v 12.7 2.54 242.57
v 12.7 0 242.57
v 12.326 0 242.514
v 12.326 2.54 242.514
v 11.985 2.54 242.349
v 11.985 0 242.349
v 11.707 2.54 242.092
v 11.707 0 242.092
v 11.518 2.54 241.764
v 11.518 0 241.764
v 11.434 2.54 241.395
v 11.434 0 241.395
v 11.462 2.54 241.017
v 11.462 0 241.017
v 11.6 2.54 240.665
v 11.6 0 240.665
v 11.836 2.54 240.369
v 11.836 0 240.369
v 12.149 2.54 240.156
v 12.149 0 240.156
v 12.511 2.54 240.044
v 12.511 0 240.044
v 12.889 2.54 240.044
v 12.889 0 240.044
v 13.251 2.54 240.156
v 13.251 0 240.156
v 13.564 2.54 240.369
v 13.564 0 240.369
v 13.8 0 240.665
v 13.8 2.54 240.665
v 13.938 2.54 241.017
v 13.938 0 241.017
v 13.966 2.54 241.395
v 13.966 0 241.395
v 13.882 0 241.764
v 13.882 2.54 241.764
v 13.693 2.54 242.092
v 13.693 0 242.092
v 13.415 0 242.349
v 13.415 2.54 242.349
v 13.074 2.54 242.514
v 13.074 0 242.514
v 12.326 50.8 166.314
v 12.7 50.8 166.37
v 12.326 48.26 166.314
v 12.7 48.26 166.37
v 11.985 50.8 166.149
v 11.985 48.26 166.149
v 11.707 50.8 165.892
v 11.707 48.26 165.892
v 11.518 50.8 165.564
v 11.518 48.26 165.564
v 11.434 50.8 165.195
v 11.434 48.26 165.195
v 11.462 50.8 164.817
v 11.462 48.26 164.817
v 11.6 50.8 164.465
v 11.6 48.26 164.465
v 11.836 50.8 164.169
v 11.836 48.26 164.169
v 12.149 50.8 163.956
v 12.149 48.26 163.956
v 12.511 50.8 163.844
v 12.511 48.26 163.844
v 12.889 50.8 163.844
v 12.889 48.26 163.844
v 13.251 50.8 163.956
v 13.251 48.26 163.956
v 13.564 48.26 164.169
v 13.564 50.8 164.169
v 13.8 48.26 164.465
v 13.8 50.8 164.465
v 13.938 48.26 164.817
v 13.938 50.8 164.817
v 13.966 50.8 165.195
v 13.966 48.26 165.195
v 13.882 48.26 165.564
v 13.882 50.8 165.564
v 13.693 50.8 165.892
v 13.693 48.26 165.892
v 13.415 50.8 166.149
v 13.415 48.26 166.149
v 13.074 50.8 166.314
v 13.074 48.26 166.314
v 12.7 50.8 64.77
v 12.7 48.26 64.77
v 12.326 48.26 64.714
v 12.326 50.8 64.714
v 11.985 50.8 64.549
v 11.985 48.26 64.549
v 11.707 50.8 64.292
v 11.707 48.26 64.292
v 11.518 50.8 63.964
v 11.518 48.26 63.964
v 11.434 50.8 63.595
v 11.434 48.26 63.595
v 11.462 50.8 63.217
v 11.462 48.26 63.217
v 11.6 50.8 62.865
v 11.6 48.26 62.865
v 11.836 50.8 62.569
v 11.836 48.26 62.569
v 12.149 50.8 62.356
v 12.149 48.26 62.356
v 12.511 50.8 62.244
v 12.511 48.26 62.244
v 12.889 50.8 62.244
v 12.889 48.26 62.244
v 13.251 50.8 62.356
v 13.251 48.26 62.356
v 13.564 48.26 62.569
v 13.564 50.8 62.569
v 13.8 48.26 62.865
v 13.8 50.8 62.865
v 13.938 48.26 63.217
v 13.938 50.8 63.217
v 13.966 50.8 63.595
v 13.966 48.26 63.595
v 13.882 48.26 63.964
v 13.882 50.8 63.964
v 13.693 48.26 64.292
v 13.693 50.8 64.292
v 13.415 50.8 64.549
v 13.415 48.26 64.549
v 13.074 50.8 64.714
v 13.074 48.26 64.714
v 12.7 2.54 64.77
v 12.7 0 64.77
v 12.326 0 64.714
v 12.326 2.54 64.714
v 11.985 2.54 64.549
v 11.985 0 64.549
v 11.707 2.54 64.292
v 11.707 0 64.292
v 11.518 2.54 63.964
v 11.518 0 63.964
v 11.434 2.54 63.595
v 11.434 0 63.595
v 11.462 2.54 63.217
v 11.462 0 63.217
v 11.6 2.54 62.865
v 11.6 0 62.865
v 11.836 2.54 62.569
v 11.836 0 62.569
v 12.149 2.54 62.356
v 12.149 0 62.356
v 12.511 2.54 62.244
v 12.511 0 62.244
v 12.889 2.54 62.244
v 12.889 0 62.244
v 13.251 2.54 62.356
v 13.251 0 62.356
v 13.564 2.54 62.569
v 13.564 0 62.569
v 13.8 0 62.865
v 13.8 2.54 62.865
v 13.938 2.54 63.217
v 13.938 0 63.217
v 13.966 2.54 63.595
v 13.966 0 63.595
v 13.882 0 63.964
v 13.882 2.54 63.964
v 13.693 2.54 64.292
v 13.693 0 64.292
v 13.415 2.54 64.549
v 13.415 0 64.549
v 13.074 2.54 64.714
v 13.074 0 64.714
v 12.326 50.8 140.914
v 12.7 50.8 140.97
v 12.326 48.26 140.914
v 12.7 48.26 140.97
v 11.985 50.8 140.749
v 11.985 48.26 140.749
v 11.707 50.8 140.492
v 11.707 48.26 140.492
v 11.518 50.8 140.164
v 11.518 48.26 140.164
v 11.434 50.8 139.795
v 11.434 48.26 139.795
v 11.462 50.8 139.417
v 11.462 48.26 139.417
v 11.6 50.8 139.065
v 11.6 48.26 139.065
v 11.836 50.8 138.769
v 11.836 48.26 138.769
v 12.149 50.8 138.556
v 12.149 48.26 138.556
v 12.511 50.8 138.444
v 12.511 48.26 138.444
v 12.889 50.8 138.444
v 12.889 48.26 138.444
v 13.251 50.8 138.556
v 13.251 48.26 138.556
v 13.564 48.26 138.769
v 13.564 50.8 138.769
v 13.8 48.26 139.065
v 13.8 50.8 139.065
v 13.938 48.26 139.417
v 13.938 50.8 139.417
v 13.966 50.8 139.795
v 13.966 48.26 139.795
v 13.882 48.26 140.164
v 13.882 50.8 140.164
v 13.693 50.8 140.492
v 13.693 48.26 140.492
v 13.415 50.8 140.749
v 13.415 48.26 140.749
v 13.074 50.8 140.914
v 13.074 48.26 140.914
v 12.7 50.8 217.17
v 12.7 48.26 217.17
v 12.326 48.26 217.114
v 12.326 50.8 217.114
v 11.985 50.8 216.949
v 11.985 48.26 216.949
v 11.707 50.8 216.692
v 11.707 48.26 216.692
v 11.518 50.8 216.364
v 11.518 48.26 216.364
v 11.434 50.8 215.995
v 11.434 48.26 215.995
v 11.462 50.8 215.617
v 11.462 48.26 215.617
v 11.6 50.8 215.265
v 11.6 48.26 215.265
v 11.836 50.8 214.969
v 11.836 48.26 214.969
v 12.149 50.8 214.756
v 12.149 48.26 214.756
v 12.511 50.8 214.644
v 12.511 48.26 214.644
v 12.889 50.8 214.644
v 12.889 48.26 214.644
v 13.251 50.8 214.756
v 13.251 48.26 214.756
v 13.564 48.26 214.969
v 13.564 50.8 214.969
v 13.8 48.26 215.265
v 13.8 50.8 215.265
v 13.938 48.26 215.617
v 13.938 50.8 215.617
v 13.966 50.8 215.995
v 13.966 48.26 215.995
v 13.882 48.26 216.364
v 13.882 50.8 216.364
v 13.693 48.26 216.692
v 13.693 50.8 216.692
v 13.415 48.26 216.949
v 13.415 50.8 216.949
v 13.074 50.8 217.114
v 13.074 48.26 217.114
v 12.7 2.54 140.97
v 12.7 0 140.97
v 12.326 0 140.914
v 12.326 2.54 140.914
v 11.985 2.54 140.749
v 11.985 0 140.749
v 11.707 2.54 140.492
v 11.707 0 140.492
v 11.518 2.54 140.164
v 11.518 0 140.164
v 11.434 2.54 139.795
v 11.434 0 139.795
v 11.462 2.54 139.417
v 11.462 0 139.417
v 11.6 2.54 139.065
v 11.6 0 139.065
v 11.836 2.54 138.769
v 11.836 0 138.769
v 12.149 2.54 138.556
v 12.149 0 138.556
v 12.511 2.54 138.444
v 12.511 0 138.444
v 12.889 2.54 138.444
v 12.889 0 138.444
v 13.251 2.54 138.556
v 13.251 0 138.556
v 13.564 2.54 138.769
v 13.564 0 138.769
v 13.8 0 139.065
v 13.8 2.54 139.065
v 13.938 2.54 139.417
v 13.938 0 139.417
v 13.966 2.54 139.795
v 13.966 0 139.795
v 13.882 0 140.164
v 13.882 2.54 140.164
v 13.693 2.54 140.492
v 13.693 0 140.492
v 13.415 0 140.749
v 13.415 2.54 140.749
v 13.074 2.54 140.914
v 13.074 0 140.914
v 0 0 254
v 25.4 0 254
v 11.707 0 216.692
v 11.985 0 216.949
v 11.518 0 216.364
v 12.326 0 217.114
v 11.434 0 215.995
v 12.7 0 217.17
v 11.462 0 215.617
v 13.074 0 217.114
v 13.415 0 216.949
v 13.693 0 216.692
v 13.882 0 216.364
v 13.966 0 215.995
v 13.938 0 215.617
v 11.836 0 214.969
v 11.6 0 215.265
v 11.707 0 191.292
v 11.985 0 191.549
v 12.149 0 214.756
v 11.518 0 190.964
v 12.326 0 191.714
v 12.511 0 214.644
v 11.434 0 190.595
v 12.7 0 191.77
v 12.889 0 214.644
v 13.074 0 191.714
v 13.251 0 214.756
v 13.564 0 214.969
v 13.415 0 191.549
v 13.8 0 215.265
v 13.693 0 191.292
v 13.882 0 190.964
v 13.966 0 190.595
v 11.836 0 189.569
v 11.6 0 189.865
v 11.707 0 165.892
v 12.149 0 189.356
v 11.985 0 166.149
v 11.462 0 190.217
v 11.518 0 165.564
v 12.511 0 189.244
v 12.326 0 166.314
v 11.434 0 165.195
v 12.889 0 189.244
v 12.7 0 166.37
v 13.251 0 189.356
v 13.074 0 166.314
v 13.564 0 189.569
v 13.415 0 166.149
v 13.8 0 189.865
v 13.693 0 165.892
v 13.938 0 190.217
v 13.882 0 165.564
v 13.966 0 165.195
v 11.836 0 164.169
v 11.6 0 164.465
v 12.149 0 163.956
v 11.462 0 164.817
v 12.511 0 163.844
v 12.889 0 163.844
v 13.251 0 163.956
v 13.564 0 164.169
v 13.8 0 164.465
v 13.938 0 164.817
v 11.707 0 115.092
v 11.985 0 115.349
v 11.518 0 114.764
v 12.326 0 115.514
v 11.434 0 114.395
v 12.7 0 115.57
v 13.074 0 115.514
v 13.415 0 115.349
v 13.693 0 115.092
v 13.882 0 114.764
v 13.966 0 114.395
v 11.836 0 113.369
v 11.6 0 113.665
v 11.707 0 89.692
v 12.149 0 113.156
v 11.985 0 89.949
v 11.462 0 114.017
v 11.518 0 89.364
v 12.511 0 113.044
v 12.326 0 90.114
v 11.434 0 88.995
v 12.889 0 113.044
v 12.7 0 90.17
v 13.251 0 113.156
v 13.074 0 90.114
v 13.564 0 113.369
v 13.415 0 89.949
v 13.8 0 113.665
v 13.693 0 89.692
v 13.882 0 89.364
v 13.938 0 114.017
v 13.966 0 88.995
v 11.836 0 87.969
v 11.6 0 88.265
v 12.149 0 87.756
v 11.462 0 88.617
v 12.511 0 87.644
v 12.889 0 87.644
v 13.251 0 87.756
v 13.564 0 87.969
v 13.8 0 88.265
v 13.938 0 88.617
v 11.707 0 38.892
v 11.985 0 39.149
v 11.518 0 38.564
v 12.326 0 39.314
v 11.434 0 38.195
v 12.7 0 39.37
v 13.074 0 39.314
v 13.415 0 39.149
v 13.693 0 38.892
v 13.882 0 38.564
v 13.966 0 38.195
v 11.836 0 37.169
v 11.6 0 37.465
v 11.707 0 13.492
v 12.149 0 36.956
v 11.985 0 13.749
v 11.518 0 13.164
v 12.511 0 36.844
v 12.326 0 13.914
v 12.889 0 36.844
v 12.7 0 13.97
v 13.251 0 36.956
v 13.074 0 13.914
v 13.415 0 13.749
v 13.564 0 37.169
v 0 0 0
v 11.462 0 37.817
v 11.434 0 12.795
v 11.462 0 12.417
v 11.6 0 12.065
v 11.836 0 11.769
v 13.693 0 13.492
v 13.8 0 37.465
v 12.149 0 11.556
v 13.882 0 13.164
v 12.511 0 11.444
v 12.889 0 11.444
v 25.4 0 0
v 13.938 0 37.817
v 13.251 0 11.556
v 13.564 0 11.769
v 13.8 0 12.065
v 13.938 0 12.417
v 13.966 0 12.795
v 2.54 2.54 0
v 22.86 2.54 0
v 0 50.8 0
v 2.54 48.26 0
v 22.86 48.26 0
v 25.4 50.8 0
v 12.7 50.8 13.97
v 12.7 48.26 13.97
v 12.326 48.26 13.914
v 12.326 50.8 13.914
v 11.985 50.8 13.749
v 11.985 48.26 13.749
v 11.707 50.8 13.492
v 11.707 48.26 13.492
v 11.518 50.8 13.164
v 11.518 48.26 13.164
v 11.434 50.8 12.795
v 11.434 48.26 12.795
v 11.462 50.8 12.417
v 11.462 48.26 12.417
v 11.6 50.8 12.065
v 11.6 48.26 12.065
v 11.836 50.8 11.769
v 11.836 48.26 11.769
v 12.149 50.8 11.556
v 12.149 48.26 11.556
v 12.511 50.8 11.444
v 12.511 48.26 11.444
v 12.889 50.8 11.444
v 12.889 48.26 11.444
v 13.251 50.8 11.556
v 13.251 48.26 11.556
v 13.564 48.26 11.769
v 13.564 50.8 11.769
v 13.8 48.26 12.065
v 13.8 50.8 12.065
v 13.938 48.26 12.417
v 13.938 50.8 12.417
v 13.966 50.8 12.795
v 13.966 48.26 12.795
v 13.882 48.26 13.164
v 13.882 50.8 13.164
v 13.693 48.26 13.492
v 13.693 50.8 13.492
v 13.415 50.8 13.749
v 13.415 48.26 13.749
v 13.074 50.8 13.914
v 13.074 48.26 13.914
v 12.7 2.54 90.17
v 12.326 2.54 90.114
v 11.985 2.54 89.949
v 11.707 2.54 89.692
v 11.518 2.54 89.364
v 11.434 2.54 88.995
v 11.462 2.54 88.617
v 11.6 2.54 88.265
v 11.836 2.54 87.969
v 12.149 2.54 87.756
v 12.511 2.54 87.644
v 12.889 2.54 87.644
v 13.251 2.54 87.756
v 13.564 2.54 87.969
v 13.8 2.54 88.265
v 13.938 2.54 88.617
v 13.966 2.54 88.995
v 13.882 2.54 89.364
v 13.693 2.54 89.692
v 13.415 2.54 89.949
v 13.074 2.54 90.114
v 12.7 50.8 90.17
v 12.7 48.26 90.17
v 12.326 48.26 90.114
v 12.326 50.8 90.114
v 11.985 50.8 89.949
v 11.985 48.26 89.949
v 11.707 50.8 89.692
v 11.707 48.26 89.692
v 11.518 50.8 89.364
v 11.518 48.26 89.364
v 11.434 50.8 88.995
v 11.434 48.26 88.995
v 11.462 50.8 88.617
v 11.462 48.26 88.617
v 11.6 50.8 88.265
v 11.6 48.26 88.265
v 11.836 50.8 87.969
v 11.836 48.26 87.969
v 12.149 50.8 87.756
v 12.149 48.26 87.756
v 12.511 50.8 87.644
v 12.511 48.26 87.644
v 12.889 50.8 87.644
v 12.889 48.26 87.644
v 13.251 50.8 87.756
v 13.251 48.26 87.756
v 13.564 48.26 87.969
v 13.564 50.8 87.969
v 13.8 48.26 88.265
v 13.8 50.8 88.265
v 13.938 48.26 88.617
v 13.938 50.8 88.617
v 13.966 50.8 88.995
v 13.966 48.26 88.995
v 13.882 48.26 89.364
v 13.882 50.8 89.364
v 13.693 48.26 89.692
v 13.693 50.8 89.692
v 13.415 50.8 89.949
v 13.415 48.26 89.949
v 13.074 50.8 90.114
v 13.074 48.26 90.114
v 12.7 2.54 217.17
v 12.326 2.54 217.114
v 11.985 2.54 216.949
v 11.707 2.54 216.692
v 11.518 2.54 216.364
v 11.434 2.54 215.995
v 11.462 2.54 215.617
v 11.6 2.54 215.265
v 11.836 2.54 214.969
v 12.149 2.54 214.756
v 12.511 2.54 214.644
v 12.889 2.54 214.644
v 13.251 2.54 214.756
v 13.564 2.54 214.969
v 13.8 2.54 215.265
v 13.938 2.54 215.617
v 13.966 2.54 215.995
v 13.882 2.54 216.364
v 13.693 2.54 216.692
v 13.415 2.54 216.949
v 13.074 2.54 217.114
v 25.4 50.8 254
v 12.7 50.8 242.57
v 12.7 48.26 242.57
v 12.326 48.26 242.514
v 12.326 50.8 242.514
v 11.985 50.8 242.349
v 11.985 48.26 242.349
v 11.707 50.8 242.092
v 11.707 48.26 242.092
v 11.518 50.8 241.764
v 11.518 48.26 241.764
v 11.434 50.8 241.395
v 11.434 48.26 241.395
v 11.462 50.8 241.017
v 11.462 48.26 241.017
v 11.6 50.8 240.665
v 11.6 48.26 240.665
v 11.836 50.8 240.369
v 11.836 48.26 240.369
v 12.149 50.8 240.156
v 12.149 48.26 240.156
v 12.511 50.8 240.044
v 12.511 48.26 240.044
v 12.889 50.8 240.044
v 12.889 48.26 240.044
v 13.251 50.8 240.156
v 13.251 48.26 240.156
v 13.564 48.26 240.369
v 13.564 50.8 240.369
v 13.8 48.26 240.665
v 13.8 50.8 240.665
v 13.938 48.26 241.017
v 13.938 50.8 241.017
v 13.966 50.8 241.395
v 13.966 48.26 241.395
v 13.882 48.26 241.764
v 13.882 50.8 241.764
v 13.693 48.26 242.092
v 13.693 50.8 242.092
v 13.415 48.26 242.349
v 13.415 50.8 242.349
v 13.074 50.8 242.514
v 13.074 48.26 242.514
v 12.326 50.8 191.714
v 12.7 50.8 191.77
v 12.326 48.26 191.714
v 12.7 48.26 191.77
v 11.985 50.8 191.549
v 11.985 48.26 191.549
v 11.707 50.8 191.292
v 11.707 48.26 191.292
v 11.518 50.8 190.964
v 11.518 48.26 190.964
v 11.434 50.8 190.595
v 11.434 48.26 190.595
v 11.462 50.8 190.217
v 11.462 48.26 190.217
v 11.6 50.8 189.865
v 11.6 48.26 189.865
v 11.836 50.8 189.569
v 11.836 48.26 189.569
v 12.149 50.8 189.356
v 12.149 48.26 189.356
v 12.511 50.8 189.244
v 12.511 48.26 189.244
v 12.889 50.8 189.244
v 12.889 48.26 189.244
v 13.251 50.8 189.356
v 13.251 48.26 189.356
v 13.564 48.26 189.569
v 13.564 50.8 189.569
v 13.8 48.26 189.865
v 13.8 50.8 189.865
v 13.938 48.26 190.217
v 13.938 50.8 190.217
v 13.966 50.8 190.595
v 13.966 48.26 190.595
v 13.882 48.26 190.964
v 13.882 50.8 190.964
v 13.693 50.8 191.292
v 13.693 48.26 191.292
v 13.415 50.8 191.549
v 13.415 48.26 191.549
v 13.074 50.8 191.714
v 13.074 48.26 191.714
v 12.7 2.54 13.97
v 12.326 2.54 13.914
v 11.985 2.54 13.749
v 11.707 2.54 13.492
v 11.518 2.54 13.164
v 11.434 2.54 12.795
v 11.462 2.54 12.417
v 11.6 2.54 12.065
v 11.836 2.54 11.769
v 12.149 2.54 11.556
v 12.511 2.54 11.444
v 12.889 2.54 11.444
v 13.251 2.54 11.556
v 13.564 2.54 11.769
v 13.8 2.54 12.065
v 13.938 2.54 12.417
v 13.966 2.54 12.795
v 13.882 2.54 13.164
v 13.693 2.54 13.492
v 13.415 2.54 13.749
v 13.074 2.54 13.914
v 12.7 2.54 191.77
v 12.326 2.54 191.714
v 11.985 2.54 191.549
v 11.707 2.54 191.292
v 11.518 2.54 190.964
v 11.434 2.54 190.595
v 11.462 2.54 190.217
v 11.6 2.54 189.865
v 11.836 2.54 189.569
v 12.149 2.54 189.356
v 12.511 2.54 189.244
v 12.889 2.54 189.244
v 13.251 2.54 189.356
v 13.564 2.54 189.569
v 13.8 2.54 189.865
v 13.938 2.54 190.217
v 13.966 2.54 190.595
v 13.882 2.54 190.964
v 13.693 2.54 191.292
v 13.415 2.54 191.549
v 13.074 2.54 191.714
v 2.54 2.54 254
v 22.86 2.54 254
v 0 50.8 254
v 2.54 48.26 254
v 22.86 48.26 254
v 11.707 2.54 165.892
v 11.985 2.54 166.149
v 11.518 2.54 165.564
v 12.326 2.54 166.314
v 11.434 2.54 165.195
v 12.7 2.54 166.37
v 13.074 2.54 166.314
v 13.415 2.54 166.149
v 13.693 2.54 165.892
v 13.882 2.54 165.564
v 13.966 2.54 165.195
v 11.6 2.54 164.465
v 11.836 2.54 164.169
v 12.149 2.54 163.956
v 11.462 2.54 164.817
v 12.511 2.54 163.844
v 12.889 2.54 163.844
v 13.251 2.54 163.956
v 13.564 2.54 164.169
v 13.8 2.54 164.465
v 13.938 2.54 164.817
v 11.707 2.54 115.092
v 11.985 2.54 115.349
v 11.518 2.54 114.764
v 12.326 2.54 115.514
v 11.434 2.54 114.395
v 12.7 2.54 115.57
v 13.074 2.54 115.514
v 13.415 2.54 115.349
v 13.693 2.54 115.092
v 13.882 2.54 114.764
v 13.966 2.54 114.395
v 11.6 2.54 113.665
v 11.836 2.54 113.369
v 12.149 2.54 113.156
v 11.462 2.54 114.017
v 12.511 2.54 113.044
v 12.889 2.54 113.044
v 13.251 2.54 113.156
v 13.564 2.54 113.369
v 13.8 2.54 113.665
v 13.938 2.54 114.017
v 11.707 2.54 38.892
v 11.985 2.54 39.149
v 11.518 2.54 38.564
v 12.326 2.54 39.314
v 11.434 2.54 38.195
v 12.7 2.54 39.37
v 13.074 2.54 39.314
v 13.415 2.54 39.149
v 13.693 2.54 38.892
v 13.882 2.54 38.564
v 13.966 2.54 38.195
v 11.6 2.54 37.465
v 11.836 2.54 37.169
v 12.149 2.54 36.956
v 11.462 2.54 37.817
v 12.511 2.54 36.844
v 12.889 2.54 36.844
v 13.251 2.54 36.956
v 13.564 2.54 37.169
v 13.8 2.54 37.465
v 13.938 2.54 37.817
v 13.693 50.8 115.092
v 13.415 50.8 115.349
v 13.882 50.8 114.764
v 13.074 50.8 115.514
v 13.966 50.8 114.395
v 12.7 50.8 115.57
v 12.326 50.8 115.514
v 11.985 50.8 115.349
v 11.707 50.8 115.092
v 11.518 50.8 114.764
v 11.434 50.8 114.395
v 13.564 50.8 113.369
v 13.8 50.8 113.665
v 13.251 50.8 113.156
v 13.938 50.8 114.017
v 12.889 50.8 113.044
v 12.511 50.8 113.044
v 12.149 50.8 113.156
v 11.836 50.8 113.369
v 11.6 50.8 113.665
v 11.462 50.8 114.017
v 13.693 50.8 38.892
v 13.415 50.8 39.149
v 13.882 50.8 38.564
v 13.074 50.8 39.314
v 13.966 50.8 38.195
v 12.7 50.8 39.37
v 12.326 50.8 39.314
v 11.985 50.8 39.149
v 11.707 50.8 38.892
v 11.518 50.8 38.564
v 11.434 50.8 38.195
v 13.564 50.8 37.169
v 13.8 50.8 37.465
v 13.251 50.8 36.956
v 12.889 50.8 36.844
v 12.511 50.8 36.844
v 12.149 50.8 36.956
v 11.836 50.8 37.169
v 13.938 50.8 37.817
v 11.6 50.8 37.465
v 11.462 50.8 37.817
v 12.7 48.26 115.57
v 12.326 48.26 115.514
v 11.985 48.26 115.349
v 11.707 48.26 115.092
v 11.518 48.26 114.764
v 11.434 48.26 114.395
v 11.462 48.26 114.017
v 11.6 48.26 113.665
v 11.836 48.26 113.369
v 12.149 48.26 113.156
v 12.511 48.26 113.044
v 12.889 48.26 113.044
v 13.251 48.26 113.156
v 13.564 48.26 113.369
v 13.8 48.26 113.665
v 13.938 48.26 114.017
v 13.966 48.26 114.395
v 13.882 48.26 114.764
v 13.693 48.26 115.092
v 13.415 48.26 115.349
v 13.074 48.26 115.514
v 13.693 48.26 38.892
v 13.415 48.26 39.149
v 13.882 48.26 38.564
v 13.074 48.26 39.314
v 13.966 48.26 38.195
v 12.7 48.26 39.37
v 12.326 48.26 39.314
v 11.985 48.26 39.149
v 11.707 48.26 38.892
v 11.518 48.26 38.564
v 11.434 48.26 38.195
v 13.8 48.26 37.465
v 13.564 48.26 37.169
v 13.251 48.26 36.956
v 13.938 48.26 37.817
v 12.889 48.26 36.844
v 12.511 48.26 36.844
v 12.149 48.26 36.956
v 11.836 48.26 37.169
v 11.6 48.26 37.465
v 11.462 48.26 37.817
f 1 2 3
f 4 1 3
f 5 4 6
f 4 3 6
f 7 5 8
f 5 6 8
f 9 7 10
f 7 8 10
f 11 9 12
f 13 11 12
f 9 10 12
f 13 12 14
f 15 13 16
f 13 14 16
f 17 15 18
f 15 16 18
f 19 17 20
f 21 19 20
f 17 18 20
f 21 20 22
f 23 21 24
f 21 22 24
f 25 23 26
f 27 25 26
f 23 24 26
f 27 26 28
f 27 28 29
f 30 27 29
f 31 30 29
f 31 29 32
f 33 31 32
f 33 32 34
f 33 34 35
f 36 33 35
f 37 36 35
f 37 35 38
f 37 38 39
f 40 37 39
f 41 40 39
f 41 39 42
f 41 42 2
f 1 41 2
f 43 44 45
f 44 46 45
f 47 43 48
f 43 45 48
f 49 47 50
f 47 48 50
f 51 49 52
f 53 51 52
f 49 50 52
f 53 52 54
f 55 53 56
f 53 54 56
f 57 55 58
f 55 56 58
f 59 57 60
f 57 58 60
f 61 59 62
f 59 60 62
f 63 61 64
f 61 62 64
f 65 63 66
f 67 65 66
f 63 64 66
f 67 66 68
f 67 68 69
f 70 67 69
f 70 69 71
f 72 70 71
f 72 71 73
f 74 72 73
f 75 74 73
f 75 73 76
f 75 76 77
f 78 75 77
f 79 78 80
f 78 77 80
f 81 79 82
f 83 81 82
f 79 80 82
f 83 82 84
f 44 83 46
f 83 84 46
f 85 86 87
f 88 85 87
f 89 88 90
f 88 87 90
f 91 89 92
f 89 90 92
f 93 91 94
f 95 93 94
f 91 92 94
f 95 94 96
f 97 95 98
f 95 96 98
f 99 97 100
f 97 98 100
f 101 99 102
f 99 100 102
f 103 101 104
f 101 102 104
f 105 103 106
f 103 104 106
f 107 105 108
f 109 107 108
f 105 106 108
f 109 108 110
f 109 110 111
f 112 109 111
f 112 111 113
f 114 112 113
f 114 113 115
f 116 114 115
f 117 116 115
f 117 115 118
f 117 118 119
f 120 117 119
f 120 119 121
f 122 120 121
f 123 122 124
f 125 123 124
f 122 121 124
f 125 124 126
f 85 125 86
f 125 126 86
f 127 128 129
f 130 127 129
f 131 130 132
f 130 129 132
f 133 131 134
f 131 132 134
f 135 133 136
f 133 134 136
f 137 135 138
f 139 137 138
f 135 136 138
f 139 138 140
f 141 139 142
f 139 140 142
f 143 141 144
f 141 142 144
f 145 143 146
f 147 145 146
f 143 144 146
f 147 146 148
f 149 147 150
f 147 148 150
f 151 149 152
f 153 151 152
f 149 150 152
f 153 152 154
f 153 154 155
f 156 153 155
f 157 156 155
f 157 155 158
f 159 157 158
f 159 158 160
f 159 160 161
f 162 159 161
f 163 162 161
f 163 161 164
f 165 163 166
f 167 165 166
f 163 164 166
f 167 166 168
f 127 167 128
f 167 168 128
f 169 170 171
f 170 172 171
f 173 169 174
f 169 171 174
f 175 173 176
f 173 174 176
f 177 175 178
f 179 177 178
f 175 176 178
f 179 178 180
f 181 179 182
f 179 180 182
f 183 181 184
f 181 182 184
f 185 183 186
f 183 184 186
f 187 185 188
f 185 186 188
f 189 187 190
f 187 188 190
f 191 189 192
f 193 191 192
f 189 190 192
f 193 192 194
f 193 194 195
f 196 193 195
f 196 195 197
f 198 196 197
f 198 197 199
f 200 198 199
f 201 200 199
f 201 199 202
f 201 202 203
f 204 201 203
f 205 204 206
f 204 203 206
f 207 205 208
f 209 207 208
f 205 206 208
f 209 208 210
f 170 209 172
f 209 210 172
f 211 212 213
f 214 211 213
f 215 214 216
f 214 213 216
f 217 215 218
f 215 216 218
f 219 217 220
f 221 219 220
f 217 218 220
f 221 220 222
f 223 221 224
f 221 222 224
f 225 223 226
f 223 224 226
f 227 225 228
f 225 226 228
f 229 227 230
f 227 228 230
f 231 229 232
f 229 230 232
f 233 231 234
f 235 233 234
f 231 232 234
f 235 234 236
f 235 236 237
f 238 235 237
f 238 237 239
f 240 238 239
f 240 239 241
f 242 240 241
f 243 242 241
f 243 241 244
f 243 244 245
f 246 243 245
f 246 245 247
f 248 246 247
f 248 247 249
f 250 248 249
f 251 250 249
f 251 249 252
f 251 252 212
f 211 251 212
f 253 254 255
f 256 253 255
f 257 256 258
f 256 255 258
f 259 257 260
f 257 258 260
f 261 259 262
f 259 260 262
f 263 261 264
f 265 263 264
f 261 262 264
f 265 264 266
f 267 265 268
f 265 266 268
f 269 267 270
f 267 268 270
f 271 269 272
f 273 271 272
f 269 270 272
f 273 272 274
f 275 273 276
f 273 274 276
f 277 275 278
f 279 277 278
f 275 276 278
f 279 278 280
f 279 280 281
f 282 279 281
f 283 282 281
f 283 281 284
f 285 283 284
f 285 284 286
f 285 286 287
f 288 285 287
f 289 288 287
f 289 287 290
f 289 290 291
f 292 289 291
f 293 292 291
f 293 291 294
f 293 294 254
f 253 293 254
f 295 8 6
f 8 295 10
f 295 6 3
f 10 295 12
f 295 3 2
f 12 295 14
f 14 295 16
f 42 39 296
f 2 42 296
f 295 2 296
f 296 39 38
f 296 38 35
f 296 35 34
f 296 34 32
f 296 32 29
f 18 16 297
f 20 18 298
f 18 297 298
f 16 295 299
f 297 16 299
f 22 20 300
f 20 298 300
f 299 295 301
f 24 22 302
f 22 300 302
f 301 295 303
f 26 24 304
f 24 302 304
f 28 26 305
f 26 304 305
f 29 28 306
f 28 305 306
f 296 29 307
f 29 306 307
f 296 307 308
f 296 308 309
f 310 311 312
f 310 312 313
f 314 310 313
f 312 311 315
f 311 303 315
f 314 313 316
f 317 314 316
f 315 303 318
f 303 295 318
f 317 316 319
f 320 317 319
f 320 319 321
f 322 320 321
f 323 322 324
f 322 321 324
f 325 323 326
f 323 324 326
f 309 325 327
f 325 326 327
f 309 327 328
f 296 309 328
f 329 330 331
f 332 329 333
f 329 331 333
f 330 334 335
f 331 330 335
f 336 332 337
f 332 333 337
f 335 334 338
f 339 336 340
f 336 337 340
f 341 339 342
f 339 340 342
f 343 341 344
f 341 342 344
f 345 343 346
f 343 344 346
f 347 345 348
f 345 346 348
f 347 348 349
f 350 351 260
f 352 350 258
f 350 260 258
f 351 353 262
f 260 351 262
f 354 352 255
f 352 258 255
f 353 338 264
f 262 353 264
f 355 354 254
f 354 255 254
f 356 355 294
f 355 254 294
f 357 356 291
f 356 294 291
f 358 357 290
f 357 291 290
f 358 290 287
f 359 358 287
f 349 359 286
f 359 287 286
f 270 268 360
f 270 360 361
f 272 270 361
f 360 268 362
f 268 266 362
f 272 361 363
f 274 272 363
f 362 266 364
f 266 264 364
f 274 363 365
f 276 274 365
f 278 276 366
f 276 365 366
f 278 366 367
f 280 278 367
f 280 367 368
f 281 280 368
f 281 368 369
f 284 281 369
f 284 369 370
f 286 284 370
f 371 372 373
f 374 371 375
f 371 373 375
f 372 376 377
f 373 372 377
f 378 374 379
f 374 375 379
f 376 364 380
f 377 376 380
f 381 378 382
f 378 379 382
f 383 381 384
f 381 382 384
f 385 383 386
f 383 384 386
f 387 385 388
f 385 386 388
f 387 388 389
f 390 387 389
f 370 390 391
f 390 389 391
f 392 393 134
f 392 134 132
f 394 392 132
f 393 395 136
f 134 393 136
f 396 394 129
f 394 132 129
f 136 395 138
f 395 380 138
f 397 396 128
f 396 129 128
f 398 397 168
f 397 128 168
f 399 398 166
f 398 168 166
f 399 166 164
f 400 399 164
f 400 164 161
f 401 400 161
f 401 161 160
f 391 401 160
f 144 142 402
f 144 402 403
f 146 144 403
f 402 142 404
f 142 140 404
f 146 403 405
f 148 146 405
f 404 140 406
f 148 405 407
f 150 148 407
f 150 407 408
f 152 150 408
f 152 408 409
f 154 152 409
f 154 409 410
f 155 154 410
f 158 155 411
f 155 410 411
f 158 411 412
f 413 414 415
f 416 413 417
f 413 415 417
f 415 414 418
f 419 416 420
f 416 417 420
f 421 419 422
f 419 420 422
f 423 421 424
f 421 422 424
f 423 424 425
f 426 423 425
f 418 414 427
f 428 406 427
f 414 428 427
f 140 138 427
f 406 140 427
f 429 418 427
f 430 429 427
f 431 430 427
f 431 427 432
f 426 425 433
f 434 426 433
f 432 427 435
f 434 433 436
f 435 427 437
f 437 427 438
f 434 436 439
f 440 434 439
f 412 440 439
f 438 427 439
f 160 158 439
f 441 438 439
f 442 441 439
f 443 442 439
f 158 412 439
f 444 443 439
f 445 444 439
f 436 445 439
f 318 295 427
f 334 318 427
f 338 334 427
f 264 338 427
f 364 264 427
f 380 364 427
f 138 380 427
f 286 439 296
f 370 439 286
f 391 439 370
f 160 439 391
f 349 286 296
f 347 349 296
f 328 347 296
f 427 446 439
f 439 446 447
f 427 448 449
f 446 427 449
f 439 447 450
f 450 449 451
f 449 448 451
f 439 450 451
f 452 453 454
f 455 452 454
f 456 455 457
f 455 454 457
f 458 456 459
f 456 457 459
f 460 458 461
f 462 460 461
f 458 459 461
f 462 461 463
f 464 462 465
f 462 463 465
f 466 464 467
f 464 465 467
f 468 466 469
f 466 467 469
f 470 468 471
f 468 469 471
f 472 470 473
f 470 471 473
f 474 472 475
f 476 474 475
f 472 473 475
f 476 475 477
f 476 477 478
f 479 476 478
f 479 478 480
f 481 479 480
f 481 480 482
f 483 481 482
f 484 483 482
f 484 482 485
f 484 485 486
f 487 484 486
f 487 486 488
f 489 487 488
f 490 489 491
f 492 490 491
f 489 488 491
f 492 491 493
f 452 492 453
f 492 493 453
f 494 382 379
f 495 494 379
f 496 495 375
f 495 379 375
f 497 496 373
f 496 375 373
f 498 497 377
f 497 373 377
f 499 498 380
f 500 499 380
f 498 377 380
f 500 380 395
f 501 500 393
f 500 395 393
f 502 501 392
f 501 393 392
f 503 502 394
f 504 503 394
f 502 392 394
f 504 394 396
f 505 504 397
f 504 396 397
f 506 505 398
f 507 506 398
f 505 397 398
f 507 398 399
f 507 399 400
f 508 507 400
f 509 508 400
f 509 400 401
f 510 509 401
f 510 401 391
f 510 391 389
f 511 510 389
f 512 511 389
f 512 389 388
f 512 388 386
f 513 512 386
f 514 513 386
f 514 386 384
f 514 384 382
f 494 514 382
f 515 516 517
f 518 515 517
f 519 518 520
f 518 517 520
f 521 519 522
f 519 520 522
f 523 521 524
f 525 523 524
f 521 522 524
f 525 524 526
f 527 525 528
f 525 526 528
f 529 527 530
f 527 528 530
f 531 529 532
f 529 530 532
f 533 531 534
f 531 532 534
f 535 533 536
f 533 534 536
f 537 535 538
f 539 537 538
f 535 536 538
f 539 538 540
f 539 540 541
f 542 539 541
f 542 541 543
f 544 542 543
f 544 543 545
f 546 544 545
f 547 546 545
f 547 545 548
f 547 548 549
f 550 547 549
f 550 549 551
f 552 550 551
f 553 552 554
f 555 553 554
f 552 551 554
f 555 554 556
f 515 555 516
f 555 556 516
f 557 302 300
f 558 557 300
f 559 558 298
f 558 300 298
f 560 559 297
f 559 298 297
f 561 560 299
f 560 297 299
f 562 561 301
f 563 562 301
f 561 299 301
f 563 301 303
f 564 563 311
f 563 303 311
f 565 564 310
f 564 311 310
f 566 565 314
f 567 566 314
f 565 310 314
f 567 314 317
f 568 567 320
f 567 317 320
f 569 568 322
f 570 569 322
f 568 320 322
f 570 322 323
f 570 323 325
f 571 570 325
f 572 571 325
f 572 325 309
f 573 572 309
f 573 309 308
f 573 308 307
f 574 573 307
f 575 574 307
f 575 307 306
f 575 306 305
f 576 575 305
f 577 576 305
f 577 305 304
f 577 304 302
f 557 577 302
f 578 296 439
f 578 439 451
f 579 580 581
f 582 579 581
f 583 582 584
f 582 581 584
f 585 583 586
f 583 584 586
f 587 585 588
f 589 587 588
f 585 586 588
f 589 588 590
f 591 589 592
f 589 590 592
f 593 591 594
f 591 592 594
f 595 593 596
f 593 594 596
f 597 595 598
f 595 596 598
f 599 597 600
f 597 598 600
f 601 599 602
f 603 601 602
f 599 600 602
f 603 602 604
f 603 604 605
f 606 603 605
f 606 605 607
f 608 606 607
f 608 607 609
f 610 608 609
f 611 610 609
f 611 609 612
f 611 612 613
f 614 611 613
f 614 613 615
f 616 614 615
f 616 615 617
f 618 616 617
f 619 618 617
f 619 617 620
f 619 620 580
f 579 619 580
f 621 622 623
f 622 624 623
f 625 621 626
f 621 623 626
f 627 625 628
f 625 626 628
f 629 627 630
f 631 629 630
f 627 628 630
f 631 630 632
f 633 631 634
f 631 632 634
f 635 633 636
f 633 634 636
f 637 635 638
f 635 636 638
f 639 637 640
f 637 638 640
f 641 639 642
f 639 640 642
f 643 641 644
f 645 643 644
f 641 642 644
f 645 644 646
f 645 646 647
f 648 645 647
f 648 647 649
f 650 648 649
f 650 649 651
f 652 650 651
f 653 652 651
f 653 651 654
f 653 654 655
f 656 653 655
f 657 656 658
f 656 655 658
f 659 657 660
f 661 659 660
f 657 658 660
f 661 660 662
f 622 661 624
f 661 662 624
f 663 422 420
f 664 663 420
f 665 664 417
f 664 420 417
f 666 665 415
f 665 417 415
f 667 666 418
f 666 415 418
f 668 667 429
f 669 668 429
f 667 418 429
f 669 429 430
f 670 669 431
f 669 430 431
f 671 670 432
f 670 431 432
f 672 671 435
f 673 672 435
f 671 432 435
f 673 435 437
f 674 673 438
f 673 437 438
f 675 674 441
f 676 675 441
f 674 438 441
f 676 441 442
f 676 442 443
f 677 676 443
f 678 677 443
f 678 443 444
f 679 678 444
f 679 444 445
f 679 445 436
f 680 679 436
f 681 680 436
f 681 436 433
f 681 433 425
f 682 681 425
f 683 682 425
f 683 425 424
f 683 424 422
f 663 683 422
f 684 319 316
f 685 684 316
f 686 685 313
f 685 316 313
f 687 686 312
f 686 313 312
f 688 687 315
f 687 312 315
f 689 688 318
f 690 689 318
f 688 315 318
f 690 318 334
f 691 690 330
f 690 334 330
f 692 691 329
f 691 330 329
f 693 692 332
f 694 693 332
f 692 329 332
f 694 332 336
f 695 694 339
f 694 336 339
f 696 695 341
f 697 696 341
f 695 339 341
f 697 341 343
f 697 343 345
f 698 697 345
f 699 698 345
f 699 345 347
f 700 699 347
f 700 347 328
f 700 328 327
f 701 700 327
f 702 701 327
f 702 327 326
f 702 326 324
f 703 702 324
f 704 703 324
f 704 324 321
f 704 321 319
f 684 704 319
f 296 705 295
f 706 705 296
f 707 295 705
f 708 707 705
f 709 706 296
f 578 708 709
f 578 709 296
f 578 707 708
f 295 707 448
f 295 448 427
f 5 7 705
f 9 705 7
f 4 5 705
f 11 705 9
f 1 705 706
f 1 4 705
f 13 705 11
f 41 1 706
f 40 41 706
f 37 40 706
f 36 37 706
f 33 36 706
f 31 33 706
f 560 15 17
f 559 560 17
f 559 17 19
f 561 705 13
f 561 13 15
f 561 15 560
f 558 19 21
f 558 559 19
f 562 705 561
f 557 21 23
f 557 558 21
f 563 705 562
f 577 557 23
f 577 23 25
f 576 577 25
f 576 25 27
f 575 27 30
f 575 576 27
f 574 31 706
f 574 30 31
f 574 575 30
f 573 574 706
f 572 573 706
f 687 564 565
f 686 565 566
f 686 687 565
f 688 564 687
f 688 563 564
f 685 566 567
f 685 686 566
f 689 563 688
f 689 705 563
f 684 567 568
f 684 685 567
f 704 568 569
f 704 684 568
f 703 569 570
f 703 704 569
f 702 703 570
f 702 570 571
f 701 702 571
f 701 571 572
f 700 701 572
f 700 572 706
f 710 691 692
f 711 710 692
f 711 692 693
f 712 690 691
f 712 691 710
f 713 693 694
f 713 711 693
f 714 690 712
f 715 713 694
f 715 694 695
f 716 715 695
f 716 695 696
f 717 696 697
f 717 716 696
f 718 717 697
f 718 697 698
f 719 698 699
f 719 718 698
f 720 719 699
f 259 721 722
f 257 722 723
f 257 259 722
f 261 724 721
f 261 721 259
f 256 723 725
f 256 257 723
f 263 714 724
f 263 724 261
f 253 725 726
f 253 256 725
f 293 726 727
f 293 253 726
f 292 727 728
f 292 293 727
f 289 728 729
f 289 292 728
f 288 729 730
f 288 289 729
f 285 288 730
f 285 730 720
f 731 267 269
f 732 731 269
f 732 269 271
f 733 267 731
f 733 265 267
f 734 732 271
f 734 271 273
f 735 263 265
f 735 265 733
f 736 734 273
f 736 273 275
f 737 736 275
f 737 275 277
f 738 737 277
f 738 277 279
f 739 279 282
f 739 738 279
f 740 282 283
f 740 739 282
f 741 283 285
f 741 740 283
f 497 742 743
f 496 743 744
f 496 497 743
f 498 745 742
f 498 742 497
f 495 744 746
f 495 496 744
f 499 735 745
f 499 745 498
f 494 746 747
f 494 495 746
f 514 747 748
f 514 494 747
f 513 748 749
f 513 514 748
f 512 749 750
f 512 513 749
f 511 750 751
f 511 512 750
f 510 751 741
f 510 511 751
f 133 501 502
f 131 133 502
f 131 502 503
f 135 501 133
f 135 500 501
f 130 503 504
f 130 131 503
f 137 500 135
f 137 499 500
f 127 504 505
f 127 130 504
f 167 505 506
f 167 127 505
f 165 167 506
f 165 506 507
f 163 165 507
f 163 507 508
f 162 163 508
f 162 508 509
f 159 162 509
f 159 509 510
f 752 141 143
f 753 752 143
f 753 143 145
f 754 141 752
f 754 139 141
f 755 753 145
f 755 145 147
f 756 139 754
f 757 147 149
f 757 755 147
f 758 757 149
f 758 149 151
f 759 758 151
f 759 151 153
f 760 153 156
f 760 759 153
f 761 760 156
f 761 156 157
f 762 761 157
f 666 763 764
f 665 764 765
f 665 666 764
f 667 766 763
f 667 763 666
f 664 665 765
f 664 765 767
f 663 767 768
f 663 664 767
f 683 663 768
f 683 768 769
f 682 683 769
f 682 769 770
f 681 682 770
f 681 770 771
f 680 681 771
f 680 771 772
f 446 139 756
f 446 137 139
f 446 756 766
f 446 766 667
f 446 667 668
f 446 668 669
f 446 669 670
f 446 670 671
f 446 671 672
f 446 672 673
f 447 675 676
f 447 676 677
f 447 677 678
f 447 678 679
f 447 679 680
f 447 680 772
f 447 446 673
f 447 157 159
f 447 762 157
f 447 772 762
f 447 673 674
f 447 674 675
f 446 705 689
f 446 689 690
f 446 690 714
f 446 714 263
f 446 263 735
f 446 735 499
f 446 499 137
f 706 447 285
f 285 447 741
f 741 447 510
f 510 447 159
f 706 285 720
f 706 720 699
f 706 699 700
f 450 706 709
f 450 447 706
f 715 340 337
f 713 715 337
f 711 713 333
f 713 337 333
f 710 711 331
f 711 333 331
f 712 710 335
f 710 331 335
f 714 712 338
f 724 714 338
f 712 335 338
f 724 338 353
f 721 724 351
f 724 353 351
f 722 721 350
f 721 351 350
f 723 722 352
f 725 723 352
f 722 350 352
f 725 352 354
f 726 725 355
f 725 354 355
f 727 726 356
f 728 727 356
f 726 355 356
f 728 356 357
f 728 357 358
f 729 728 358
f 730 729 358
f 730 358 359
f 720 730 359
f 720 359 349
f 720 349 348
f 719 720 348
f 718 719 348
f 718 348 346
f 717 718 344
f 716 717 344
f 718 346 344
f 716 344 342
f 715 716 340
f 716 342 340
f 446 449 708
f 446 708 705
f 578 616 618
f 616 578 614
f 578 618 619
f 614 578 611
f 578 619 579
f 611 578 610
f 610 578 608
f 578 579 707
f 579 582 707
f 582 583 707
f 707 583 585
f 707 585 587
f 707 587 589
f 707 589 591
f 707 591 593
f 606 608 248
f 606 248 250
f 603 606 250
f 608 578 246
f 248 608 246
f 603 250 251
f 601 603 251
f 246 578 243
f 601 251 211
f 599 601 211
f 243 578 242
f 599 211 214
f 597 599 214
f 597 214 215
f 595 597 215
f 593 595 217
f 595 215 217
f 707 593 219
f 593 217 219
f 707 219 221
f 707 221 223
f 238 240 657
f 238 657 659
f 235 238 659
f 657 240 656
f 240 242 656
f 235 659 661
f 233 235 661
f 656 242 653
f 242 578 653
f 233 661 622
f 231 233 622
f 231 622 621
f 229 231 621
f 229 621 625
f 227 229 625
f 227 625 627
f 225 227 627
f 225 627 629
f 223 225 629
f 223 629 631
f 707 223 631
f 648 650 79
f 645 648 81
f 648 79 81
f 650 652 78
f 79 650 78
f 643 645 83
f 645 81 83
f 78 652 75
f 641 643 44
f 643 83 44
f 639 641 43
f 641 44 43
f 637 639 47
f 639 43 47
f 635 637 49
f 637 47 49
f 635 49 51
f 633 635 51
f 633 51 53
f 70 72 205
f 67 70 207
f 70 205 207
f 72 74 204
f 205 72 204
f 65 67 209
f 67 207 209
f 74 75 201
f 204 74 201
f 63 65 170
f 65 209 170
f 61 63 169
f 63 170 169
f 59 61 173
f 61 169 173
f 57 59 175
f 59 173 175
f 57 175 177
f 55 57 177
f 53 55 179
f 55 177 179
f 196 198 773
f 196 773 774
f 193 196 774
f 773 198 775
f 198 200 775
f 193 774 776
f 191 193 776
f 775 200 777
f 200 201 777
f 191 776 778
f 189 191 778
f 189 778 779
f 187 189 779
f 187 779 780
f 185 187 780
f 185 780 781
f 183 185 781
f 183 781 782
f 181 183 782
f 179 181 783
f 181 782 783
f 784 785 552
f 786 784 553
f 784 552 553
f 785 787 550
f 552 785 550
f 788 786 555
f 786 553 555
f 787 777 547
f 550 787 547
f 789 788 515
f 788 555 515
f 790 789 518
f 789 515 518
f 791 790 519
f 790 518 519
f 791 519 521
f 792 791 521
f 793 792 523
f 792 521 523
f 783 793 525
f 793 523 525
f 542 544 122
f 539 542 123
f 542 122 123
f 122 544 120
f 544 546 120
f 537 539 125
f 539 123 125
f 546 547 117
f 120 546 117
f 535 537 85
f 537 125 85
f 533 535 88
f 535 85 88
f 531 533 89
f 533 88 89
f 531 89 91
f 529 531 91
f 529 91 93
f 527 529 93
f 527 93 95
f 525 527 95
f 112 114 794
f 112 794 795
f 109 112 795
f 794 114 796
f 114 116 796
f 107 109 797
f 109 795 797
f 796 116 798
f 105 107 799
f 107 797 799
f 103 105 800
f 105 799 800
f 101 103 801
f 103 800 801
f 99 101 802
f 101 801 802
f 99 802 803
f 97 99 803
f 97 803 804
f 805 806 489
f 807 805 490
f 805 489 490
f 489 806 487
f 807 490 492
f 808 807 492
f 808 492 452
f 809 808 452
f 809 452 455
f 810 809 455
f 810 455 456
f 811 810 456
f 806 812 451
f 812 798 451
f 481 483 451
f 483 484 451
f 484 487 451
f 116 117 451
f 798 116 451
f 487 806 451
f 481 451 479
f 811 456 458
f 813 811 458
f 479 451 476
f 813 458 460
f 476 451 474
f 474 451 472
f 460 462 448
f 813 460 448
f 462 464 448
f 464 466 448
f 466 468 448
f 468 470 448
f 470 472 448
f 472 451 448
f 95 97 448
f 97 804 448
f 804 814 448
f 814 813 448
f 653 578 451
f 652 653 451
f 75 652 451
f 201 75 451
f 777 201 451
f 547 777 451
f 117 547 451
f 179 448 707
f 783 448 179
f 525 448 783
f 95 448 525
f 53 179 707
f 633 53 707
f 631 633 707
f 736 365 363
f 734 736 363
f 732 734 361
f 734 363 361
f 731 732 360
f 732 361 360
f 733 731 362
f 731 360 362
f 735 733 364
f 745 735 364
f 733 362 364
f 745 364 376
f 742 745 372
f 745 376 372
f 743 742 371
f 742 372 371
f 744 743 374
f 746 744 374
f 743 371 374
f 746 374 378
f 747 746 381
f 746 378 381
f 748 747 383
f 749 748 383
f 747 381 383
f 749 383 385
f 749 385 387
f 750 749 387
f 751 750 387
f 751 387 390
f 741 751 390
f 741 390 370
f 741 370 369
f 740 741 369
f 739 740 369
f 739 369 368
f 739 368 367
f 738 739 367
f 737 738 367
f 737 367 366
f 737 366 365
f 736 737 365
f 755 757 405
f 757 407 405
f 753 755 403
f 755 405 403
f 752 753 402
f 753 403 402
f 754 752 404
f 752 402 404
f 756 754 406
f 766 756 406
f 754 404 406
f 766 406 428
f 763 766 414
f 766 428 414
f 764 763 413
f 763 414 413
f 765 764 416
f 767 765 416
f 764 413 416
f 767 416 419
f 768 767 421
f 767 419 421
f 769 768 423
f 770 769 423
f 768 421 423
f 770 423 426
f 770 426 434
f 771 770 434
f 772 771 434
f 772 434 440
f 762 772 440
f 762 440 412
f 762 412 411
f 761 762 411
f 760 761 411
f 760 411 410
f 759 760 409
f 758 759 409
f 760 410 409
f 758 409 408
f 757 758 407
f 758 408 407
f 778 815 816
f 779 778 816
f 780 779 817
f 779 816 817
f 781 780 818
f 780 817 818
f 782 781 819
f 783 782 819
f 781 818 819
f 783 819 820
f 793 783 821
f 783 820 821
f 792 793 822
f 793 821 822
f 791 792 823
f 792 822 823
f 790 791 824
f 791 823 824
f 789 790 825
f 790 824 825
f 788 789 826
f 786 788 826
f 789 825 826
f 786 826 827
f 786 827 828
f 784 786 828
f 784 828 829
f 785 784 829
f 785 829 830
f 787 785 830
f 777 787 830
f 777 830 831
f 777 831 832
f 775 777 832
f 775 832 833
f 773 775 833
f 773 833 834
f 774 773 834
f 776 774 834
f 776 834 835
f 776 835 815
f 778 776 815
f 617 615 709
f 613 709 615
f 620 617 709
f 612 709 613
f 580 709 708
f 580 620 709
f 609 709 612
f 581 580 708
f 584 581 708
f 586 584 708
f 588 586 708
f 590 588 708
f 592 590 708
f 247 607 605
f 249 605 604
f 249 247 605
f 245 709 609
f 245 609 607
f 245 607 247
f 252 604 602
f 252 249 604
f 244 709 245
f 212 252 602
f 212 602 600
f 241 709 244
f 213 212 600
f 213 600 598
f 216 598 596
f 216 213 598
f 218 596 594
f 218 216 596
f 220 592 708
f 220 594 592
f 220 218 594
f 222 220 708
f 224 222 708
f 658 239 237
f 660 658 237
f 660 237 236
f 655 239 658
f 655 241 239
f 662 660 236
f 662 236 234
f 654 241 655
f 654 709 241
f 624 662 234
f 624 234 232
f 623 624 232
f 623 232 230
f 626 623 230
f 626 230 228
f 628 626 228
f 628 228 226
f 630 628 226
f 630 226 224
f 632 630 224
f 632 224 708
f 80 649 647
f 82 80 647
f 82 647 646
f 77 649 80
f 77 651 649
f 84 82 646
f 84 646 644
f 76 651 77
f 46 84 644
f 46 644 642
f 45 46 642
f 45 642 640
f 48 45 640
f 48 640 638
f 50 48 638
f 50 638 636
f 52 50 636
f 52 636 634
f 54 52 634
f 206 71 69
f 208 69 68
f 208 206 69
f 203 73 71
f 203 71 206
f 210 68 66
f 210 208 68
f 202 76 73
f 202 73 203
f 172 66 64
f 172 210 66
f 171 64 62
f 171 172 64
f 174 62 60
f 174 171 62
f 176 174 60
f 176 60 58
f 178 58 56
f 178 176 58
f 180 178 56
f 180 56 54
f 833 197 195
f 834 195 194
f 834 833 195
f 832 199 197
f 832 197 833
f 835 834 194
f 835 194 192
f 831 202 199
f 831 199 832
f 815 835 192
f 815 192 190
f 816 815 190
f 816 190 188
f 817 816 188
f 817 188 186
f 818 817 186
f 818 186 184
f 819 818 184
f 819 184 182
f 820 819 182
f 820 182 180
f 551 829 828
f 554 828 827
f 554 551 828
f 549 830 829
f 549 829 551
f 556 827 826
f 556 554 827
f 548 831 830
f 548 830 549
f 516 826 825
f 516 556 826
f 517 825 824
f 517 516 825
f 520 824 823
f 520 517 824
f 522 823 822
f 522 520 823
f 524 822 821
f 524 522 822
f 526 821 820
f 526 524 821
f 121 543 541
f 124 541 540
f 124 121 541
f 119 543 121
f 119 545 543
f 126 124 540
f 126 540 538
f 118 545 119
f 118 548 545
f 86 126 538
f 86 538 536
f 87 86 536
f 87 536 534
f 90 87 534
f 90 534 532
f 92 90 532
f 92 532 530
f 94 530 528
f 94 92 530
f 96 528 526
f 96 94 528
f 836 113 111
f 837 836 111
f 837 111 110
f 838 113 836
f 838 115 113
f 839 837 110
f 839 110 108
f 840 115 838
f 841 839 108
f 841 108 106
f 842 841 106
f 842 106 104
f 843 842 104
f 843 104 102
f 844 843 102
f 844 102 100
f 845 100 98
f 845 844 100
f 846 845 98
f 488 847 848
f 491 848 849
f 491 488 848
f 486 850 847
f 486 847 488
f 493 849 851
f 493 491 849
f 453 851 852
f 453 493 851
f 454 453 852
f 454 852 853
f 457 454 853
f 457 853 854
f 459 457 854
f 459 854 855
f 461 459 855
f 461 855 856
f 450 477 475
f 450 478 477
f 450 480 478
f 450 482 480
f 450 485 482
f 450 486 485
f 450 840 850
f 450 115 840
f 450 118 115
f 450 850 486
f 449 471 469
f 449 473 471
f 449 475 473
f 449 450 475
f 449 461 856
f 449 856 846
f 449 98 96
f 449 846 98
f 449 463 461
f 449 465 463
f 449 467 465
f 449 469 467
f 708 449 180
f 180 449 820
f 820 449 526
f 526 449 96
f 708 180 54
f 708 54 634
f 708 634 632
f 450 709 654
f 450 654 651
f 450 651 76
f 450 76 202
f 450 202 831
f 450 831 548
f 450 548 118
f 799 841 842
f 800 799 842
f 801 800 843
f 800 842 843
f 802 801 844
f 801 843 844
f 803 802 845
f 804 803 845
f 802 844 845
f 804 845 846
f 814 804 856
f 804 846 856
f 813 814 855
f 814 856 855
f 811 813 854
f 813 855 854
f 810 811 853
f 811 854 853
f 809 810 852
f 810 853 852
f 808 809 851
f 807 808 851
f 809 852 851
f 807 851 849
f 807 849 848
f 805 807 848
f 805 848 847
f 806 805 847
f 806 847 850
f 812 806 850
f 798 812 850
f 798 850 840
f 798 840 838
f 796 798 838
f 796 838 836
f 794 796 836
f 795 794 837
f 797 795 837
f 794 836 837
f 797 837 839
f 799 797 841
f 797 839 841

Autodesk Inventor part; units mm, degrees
ref_plane "YZ Plane" through (0, 0, 0) normal (1, 0, 0) x (0, 1, 0)
ref_plane "XZ Plane" through (0, 0, 0) normal (0, 1, 0) x (-1, 0, 0)
ref_plane "XY Plane" through (0, 0, 0) normal (0, 0, 1) x (1, 0, 0)
sketch "Sketch1" plane through (0, 0, 0) normal (0, 0, 1) x (1, 0, 0)
  line L0 (0, 0) -> (25.4, 0)
  line L1 (25.4, 0) -> (25.4, 50.8)
  line L2 (25.4, 50.8) -> (0, 50.8)
  line L3 (0, 50.8) -> (0, 0)
  dimension "d0" = 25.4
  dimension "d1" = 50.8
extrude "Extrusion1" add sketch "Sketch1" along normal blind 254
shell "Shell1" thickness 2.54 removed faces 2 at (8.4667, 33.8667, 0) at (8.4667, 33.8667, 254)
sketch "Sketch2" plane through (0, 50.8, 0) normal (0, 1, 0) x (1, 0, 0)
  line L0 (25.4, 0) -> (0, 0) projected
  line L1 (0, 0) -> (0, -254) projected
  point P0 (12.7, -12.7)
  point P1 (12.7, -38.1)
  point P2 (12.7, -63.5)
  point P3 (12.7, -88.9)
  point P4 (12.7, -114.3)
  point P5 (12.7, -139.7)
  point P6 (12.7, -165.1)
  point P7 (12.7, -190.5)
  point P8 (12.7, -215.9)
  point P9 (12.7, -241.3)
  point P10 (12.7, -266.7)
  point P11 (12.7, -292.1)
  point P12 (12.7, -317.5)
  point P13 (12.7, -342.9)
  point P14 (12.7, -368.3)
  point P15 (12.7, -393.7)
  point P16 (12.7, -419.1)
  point P17 (12.7, -444.5)
  point P18 (12.7, -469.9)
  point P19 (12.7, -495.3)
  point P20 (12.7, -520.7)
  point P21 (12.7, -546.1)
  point P22 (12.7, -571.5)
  point P23 (12.7, -596.9)
  point P24 (12.7, -622.3)
  point P25 (12.7, -647.7)
  point P26 (12.7, -673.1)
  point P27 (12.7, -698.5)
  point P28 (12.7, -723.9)
  point P29 (12.7, -749.3)
  point P30 (12.7, -774.7)
  point P31 (12.7, -800.1)
  point P32 (12.7, -825.5)
  point P33 (12.7, -850.9)
  point P34 (12.7, -876.3)
  point P35 (12.7, -901.7)
  point P36 (12.7, -927.1)
  dimension "d5" = 12.7
  dimension "d6" = 12.7
  dimension "d9" = 25.4
hole "Hole1" at (12.7, 50.8, 12.7) at (12.7, 50.8, 38.1) at (12.7, 50.8, 63.5) at (12.7, 50.8, 88.9) at (12.7, 50.8, 114.3) at (12.7, 50.8, 139.7) at (12.7, 50.8, 165.1) at (12.7, 50.8, 190.5) at (12.7, 50.8, 215.9) at (12.7, 50.8, 241.3) at (12.7, 50.8, 266.7) at (12.7, 50.8, 292.1) at (12.7, 50.8, 317.5) at (12.7, 50.8, 342.9) at (12.7, 50.8, 368.3) at (12.7, 50.8, 393.7) at (12.7, 50.8, 419.1) at (12.7, 50.8, 444.5) at (12.7, 50.8, 469.9) at (12.7, 50.8, 495.3) at (12.7, 50.8, 520.7) at (12.7, 50.8, 546.1) at (12.7, 50.8, 571.5) at (12.7, 50.8, 596.9) at (12.7, 50.8, 622.3) at (12.7, 50.8, 647.7) at (12.7, 50.8, 673.1) at (12.7, 50.8, 698.5) at (12.7, 50.8, 723.9) at (12.7, 50.8, 749.3) at (12.7, 50.8, 774.7) at (12.7, 50.8, 800.1) at (12.7, 50.8, 825.5) at (12.7, 50.8, 850.9) at (12.7, 50.8, 876.3) at (12.7, 50.8, 901.7) direction (0, -1, 0) diameter 2.54 depth 50.8 tip angle 118
properties part number "Support Pivs cross 2522" material "Aluminum 6061"
